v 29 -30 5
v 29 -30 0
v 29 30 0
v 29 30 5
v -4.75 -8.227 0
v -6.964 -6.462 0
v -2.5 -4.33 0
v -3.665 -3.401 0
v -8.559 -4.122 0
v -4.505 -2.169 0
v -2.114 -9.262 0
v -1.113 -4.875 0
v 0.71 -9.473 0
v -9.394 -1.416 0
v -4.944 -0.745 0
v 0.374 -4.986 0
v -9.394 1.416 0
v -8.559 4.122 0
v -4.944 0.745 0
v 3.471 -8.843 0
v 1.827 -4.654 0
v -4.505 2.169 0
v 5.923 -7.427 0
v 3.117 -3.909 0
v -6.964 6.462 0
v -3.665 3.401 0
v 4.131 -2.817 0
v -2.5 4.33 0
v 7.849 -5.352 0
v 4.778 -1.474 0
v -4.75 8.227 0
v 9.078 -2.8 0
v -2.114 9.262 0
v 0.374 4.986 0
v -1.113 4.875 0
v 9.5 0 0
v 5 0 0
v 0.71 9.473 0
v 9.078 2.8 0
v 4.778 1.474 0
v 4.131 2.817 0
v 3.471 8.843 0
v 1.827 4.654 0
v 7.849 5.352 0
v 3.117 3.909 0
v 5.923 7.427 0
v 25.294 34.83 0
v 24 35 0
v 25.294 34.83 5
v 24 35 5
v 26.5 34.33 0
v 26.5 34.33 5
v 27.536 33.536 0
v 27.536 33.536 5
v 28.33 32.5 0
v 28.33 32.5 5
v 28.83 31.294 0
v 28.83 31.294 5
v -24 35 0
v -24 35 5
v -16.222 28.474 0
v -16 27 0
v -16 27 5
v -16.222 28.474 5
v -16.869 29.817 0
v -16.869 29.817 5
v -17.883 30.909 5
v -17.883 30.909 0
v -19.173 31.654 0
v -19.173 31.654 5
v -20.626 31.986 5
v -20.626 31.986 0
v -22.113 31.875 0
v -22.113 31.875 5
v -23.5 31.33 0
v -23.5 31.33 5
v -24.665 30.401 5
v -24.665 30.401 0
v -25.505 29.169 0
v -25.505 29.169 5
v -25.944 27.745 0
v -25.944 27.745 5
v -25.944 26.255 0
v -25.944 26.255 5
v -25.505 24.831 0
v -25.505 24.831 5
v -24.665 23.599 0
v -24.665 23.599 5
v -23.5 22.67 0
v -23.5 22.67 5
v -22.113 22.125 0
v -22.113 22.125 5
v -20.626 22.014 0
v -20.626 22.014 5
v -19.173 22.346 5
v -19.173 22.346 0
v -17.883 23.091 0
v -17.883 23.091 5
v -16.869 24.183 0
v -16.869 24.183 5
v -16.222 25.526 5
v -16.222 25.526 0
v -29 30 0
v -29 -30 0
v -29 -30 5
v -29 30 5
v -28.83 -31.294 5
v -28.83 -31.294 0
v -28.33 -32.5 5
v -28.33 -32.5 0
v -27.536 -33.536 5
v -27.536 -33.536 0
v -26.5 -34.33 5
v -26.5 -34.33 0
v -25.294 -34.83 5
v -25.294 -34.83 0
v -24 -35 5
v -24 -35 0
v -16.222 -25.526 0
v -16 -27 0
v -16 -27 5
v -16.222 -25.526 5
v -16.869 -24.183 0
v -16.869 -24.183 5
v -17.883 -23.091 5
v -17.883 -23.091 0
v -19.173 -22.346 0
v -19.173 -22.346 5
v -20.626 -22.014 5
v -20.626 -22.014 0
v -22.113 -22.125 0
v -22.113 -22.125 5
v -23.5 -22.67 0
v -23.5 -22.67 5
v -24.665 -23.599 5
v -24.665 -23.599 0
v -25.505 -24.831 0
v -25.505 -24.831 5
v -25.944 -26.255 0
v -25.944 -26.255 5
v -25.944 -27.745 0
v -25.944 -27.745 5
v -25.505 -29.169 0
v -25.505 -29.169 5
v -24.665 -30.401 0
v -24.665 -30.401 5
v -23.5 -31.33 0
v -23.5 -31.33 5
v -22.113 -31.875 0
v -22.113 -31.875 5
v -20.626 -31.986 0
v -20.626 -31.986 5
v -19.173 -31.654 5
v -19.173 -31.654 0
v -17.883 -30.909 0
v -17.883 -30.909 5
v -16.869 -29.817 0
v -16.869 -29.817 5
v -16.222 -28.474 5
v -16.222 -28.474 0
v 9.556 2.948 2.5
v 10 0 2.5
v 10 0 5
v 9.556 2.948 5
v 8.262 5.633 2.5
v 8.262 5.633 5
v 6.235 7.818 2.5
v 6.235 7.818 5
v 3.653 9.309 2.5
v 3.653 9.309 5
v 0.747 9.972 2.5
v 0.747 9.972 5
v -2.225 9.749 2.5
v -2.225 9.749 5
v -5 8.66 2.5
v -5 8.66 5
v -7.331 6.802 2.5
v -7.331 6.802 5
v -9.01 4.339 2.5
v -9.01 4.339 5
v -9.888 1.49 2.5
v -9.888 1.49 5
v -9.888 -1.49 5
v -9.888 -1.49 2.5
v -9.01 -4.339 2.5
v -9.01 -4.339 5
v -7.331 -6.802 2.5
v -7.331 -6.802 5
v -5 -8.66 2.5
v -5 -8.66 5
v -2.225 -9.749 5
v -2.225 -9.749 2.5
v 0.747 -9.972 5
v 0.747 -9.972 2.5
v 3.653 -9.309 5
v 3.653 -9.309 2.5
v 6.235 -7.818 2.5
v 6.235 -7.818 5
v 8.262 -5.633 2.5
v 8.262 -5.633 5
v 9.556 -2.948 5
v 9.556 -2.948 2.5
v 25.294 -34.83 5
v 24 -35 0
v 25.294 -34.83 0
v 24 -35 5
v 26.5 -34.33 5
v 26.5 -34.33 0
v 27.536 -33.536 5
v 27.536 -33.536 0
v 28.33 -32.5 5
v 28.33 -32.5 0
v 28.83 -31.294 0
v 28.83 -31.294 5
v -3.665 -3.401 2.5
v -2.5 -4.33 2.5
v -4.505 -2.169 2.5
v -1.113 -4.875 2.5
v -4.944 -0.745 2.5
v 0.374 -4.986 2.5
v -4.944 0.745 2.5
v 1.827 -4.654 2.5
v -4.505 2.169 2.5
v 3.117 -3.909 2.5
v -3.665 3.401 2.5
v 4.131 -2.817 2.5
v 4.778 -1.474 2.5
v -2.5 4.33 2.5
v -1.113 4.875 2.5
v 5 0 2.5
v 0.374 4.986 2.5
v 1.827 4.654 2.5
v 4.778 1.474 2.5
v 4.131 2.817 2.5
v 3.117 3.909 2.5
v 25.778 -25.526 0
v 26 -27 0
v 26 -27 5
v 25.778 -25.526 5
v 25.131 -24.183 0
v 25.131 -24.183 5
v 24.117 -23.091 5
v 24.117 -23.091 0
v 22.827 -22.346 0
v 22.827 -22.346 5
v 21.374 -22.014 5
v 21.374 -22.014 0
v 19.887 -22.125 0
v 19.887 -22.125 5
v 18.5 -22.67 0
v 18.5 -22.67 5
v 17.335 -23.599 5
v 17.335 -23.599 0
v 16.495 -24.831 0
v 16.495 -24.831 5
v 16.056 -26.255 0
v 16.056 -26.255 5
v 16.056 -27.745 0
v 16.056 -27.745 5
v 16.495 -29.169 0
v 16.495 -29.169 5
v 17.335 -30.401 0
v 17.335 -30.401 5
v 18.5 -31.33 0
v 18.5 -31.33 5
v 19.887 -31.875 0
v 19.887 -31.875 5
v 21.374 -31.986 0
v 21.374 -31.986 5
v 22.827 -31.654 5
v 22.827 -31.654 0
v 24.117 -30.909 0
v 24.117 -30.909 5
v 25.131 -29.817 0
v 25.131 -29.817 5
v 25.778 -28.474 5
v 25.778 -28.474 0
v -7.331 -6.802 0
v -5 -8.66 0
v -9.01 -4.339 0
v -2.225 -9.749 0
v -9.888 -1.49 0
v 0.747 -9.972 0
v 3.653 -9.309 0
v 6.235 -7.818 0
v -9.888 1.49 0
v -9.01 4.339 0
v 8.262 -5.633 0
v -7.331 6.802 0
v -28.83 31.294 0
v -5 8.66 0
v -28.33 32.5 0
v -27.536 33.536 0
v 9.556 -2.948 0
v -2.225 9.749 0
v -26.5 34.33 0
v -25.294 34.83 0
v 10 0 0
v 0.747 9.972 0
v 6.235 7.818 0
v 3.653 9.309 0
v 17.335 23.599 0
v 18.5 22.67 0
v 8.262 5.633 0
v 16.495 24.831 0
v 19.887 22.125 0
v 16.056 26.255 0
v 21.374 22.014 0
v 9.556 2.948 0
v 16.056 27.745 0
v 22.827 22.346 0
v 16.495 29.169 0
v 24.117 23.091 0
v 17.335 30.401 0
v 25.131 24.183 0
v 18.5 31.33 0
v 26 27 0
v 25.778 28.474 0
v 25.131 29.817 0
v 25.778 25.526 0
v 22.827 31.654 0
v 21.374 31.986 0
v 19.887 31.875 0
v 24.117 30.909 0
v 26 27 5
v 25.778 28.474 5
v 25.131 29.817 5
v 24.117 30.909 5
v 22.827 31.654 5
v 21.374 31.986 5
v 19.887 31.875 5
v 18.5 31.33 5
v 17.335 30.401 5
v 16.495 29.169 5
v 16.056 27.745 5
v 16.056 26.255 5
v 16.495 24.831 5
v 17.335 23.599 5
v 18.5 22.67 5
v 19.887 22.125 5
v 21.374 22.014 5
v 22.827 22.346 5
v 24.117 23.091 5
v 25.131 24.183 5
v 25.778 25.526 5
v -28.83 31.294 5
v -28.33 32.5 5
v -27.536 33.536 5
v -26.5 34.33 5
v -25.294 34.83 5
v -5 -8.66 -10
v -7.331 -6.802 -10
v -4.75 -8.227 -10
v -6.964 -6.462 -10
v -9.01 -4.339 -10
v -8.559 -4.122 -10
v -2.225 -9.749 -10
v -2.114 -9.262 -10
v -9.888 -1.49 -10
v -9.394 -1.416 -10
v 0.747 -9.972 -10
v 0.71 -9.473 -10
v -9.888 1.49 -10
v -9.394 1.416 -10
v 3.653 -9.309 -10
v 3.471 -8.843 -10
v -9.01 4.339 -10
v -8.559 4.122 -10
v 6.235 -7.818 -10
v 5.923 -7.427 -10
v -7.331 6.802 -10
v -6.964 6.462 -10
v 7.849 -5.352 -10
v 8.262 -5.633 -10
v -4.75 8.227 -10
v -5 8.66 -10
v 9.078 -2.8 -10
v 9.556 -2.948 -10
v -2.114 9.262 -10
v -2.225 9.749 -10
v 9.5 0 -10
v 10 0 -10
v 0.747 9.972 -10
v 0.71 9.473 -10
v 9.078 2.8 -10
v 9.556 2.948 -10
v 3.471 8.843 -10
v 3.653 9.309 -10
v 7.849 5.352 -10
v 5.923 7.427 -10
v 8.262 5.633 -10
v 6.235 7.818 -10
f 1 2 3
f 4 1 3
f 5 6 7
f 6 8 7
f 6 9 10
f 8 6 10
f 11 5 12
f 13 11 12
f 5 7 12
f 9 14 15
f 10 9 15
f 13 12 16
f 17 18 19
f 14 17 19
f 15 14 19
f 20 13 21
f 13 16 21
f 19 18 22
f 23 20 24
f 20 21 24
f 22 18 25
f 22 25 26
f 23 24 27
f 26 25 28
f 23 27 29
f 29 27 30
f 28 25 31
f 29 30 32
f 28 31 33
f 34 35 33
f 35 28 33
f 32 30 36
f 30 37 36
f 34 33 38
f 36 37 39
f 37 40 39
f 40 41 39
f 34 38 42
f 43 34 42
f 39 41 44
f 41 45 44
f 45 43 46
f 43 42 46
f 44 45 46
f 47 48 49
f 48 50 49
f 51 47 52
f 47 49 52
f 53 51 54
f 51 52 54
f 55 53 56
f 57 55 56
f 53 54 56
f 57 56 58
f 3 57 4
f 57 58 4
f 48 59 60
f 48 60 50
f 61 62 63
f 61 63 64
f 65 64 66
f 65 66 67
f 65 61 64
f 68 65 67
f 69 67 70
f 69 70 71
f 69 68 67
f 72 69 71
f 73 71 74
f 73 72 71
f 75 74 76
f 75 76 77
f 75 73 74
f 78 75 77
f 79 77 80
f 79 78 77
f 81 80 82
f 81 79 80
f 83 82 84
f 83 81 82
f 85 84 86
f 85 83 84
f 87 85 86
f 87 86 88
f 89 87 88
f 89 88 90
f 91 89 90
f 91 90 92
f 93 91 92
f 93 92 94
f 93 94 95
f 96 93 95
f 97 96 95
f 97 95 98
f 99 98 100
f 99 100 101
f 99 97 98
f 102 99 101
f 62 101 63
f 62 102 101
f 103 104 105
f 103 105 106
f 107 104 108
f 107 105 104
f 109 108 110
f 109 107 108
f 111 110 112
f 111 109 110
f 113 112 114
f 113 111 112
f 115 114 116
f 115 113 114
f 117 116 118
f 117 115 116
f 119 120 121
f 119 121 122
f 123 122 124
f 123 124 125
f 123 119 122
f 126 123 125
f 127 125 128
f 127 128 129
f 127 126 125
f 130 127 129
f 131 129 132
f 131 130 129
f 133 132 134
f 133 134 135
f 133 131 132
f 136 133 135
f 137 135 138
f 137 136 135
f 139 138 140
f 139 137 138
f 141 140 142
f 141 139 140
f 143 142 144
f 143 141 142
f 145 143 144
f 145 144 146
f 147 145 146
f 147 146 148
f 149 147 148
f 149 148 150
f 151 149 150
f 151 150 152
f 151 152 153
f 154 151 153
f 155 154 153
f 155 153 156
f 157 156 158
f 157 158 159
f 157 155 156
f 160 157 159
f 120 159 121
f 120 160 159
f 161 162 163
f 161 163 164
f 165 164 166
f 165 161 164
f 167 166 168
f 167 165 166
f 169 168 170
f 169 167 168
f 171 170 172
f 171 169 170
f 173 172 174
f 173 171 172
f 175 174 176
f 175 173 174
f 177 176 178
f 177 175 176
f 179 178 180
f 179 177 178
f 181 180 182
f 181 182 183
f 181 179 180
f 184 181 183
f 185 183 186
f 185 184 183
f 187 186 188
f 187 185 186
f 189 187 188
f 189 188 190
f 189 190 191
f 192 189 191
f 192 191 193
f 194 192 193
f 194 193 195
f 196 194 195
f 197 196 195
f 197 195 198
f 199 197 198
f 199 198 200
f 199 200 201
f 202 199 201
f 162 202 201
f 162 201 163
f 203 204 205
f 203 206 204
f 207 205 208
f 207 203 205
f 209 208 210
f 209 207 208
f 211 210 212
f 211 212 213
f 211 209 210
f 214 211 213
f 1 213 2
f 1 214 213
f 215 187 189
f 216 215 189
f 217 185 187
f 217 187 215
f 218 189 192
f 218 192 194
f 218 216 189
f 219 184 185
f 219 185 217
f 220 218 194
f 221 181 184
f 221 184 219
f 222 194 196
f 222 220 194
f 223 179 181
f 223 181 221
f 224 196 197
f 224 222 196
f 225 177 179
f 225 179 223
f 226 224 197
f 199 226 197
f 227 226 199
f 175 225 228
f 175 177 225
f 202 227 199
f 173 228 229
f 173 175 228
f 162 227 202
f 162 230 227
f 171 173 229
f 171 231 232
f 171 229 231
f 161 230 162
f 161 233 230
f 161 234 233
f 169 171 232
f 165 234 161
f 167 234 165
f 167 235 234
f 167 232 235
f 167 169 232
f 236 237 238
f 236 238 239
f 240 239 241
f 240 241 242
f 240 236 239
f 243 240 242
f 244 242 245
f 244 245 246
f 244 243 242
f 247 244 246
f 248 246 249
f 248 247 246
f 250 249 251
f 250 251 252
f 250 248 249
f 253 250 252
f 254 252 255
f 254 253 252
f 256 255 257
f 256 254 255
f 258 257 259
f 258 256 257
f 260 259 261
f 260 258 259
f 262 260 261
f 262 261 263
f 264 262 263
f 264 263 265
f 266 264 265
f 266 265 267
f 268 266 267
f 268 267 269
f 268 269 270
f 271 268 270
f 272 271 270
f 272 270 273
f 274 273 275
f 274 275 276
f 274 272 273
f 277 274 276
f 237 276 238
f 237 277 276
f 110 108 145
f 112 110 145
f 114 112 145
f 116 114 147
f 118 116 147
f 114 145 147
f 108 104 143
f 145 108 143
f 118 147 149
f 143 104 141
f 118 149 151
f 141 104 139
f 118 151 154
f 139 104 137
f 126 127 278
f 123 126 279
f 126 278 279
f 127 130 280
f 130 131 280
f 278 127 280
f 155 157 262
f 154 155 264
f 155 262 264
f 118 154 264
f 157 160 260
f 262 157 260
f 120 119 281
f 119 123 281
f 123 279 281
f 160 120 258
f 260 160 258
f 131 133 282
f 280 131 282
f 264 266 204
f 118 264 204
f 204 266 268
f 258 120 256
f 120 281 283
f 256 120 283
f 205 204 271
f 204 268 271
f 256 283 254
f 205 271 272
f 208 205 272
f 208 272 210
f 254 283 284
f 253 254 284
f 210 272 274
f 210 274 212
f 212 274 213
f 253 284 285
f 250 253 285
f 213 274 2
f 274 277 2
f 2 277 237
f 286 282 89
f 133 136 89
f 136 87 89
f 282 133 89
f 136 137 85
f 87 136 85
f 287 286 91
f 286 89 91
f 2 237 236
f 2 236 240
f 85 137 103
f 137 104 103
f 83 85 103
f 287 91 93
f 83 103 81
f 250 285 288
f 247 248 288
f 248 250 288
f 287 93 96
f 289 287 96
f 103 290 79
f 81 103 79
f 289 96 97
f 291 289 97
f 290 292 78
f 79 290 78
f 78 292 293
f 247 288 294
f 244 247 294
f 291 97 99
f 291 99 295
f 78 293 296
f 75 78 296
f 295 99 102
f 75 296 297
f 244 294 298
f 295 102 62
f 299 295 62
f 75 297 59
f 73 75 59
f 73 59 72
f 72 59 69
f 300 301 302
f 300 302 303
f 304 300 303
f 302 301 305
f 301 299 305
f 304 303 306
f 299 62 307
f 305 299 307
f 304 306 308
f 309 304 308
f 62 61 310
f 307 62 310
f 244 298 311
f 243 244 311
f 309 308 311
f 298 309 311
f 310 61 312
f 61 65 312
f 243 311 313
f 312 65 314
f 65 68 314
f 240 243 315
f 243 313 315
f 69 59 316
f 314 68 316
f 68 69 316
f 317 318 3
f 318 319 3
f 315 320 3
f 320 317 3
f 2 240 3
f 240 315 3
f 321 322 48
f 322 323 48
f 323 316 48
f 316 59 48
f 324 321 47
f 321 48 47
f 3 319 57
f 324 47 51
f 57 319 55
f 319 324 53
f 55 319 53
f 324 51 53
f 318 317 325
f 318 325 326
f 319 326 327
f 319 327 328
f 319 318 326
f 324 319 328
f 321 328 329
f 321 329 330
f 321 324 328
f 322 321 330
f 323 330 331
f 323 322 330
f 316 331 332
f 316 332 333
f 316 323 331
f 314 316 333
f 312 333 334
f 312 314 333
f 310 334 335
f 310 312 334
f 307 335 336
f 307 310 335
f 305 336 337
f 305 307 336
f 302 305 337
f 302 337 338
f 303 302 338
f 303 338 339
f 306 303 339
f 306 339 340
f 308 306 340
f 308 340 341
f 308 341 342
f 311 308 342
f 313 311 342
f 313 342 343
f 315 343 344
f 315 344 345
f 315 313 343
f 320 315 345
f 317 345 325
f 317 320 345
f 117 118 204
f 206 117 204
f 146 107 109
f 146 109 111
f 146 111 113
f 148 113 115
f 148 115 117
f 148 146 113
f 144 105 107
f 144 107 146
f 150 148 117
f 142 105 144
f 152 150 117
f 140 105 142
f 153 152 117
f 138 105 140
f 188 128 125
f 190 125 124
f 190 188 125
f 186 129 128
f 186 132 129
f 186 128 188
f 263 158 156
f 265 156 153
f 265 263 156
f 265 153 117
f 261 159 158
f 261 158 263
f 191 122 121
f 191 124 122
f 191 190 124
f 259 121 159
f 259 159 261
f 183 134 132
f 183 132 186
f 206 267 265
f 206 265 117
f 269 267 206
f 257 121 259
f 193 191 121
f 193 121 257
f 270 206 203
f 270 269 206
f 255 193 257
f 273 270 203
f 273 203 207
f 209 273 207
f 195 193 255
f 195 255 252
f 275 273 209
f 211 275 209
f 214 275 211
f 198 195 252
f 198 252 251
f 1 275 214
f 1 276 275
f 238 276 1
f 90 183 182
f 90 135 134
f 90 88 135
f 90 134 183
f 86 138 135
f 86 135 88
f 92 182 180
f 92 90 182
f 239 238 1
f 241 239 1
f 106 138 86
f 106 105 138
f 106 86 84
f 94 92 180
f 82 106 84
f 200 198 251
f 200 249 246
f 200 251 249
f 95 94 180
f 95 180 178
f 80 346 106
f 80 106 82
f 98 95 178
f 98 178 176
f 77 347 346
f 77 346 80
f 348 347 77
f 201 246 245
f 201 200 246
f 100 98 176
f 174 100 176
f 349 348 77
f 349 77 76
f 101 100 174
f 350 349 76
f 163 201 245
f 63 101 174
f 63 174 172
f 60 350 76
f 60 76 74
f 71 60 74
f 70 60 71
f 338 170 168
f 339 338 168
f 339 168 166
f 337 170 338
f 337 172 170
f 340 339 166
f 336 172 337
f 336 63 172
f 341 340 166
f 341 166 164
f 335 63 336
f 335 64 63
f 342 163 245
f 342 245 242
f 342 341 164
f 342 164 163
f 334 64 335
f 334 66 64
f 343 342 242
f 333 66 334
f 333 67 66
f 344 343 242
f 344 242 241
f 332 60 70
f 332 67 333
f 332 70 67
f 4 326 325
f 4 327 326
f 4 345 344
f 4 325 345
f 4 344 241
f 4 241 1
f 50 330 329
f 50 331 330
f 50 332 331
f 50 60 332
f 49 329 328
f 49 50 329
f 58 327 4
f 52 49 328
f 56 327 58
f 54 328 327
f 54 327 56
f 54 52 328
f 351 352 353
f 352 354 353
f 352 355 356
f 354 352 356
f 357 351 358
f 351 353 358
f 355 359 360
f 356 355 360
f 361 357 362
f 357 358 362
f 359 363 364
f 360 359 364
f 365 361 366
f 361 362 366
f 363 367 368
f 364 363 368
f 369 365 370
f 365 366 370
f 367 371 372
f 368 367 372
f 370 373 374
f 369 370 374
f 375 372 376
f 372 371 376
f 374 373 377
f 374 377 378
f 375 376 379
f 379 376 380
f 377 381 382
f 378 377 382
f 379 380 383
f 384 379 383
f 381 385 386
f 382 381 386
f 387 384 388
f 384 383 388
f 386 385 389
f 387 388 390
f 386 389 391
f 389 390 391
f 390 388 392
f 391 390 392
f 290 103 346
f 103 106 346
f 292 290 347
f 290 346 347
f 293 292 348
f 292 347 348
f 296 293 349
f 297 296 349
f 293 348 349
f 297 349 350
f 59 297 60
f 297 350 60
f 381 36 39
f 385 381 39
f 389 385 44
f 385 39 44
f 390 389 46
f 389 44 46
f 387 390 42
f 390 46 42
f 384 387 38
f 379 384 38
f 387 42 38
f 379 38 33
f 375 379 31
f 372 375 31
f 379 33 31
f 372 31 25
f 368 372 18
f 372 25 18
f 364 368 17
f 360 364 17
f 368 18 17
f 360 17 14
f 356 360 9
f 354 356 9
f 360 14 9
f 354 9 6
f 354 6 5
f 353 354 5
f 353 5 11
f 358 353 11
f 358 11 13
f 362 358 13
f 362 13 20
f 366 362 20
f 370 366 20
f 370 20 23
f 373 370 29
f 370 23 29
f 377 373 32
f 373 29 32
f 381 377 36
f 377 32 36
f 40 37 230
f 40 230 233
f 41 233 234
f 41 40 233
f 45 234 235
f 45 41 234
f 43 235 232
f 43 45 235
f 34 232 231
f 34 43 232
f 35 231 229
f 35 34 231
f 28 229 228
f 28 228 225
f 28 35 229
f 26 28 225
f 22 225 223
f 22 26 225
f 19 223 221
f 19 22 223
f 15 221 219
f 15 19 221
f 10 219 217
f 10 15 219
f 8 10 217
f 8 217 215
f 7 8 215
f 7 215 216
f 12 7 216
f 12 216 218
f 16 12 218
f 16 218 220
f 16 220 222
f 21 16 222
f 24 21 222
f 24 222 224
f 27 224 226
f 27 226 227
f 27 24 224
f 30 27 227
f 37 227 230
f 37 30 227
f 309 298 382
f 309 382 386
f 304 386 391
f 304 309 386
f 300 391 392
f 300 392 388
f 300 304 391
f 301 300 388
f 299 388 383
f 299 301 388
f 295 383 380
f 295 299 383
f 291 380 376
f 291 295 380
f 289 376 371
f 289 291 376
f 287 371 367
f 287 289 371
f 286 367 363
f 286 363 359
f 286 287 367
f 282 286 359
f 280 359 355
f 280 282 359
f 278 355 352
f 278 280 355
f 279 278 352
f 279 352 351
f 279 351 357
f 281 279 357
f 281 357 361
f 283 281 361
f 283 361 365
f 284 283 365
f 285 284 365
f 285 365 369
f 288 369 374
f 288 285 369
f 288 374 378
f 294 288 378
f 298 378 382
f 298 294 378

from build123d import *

# Parameters (mm, degrees)
F0_W     = 58
F0_H     = 70
F0_R     = 5
F0_R_2   = 10
F1_DEPTH = 5
F0_R_3   = 9.5
F2_DEPTH = 2.5
F3_DEPTH = 10
F4_R     = 5


with BuildPart() as f1:
    # F0 (on Top) → F1 (new body)
    with BuildSketch(Plane.XY):
        Rectangle(F0_W, F0_H)
        with Locations((-21, -27)):
            Circle(F0_R, mode=Mode.SUBTRACT)
        with Locations((21, -27)):
            Circle(F0_R, mode=Mode.SUBTRACT)
        with Locations((-21, 27)):
            Circle(F0_R, mode=Mode.SUBTRACT)
        Circle(F0_R_2, mode=Mode.SUBTRACT)
        with Locations((21, 27)):
            Circle(F0_R, mode=Mode.SUBTRACT)
    extrude(amount=F1_DEPTH)

    # F0 (on Top) → F2 (join)
    with BuildSketch(Plane.XY):
        Circle(F0_R_2)
        Circle(F0_R_3, mode=Mode.SUBTRACT)
        Circle(F0_R_3)
        Circle(F0_R, mode=Mode.SUBTRACT)
    extrude(amount=F2_DEPTH)

    # F0 (on Top) → F3 (join)
    with BuildSketch(Plane.XY):
        Circle(F0_R_2)
        Circle(F0_R_3, mode=Mode.SUBTRACT)
    extrude(amount=-F3_DEPTH)

    # F4
    f4_edges = [f1.edges().sort_by_distance(p)[0] for p in [
        (-29, -35, 2.5),
        (29, -35, 2.5),
        (29, 35, 2.5),
        (-29, 35, 2.5),
    ]]
    fillet(f4_edges, radius=F4_R)


solid = f1.part
